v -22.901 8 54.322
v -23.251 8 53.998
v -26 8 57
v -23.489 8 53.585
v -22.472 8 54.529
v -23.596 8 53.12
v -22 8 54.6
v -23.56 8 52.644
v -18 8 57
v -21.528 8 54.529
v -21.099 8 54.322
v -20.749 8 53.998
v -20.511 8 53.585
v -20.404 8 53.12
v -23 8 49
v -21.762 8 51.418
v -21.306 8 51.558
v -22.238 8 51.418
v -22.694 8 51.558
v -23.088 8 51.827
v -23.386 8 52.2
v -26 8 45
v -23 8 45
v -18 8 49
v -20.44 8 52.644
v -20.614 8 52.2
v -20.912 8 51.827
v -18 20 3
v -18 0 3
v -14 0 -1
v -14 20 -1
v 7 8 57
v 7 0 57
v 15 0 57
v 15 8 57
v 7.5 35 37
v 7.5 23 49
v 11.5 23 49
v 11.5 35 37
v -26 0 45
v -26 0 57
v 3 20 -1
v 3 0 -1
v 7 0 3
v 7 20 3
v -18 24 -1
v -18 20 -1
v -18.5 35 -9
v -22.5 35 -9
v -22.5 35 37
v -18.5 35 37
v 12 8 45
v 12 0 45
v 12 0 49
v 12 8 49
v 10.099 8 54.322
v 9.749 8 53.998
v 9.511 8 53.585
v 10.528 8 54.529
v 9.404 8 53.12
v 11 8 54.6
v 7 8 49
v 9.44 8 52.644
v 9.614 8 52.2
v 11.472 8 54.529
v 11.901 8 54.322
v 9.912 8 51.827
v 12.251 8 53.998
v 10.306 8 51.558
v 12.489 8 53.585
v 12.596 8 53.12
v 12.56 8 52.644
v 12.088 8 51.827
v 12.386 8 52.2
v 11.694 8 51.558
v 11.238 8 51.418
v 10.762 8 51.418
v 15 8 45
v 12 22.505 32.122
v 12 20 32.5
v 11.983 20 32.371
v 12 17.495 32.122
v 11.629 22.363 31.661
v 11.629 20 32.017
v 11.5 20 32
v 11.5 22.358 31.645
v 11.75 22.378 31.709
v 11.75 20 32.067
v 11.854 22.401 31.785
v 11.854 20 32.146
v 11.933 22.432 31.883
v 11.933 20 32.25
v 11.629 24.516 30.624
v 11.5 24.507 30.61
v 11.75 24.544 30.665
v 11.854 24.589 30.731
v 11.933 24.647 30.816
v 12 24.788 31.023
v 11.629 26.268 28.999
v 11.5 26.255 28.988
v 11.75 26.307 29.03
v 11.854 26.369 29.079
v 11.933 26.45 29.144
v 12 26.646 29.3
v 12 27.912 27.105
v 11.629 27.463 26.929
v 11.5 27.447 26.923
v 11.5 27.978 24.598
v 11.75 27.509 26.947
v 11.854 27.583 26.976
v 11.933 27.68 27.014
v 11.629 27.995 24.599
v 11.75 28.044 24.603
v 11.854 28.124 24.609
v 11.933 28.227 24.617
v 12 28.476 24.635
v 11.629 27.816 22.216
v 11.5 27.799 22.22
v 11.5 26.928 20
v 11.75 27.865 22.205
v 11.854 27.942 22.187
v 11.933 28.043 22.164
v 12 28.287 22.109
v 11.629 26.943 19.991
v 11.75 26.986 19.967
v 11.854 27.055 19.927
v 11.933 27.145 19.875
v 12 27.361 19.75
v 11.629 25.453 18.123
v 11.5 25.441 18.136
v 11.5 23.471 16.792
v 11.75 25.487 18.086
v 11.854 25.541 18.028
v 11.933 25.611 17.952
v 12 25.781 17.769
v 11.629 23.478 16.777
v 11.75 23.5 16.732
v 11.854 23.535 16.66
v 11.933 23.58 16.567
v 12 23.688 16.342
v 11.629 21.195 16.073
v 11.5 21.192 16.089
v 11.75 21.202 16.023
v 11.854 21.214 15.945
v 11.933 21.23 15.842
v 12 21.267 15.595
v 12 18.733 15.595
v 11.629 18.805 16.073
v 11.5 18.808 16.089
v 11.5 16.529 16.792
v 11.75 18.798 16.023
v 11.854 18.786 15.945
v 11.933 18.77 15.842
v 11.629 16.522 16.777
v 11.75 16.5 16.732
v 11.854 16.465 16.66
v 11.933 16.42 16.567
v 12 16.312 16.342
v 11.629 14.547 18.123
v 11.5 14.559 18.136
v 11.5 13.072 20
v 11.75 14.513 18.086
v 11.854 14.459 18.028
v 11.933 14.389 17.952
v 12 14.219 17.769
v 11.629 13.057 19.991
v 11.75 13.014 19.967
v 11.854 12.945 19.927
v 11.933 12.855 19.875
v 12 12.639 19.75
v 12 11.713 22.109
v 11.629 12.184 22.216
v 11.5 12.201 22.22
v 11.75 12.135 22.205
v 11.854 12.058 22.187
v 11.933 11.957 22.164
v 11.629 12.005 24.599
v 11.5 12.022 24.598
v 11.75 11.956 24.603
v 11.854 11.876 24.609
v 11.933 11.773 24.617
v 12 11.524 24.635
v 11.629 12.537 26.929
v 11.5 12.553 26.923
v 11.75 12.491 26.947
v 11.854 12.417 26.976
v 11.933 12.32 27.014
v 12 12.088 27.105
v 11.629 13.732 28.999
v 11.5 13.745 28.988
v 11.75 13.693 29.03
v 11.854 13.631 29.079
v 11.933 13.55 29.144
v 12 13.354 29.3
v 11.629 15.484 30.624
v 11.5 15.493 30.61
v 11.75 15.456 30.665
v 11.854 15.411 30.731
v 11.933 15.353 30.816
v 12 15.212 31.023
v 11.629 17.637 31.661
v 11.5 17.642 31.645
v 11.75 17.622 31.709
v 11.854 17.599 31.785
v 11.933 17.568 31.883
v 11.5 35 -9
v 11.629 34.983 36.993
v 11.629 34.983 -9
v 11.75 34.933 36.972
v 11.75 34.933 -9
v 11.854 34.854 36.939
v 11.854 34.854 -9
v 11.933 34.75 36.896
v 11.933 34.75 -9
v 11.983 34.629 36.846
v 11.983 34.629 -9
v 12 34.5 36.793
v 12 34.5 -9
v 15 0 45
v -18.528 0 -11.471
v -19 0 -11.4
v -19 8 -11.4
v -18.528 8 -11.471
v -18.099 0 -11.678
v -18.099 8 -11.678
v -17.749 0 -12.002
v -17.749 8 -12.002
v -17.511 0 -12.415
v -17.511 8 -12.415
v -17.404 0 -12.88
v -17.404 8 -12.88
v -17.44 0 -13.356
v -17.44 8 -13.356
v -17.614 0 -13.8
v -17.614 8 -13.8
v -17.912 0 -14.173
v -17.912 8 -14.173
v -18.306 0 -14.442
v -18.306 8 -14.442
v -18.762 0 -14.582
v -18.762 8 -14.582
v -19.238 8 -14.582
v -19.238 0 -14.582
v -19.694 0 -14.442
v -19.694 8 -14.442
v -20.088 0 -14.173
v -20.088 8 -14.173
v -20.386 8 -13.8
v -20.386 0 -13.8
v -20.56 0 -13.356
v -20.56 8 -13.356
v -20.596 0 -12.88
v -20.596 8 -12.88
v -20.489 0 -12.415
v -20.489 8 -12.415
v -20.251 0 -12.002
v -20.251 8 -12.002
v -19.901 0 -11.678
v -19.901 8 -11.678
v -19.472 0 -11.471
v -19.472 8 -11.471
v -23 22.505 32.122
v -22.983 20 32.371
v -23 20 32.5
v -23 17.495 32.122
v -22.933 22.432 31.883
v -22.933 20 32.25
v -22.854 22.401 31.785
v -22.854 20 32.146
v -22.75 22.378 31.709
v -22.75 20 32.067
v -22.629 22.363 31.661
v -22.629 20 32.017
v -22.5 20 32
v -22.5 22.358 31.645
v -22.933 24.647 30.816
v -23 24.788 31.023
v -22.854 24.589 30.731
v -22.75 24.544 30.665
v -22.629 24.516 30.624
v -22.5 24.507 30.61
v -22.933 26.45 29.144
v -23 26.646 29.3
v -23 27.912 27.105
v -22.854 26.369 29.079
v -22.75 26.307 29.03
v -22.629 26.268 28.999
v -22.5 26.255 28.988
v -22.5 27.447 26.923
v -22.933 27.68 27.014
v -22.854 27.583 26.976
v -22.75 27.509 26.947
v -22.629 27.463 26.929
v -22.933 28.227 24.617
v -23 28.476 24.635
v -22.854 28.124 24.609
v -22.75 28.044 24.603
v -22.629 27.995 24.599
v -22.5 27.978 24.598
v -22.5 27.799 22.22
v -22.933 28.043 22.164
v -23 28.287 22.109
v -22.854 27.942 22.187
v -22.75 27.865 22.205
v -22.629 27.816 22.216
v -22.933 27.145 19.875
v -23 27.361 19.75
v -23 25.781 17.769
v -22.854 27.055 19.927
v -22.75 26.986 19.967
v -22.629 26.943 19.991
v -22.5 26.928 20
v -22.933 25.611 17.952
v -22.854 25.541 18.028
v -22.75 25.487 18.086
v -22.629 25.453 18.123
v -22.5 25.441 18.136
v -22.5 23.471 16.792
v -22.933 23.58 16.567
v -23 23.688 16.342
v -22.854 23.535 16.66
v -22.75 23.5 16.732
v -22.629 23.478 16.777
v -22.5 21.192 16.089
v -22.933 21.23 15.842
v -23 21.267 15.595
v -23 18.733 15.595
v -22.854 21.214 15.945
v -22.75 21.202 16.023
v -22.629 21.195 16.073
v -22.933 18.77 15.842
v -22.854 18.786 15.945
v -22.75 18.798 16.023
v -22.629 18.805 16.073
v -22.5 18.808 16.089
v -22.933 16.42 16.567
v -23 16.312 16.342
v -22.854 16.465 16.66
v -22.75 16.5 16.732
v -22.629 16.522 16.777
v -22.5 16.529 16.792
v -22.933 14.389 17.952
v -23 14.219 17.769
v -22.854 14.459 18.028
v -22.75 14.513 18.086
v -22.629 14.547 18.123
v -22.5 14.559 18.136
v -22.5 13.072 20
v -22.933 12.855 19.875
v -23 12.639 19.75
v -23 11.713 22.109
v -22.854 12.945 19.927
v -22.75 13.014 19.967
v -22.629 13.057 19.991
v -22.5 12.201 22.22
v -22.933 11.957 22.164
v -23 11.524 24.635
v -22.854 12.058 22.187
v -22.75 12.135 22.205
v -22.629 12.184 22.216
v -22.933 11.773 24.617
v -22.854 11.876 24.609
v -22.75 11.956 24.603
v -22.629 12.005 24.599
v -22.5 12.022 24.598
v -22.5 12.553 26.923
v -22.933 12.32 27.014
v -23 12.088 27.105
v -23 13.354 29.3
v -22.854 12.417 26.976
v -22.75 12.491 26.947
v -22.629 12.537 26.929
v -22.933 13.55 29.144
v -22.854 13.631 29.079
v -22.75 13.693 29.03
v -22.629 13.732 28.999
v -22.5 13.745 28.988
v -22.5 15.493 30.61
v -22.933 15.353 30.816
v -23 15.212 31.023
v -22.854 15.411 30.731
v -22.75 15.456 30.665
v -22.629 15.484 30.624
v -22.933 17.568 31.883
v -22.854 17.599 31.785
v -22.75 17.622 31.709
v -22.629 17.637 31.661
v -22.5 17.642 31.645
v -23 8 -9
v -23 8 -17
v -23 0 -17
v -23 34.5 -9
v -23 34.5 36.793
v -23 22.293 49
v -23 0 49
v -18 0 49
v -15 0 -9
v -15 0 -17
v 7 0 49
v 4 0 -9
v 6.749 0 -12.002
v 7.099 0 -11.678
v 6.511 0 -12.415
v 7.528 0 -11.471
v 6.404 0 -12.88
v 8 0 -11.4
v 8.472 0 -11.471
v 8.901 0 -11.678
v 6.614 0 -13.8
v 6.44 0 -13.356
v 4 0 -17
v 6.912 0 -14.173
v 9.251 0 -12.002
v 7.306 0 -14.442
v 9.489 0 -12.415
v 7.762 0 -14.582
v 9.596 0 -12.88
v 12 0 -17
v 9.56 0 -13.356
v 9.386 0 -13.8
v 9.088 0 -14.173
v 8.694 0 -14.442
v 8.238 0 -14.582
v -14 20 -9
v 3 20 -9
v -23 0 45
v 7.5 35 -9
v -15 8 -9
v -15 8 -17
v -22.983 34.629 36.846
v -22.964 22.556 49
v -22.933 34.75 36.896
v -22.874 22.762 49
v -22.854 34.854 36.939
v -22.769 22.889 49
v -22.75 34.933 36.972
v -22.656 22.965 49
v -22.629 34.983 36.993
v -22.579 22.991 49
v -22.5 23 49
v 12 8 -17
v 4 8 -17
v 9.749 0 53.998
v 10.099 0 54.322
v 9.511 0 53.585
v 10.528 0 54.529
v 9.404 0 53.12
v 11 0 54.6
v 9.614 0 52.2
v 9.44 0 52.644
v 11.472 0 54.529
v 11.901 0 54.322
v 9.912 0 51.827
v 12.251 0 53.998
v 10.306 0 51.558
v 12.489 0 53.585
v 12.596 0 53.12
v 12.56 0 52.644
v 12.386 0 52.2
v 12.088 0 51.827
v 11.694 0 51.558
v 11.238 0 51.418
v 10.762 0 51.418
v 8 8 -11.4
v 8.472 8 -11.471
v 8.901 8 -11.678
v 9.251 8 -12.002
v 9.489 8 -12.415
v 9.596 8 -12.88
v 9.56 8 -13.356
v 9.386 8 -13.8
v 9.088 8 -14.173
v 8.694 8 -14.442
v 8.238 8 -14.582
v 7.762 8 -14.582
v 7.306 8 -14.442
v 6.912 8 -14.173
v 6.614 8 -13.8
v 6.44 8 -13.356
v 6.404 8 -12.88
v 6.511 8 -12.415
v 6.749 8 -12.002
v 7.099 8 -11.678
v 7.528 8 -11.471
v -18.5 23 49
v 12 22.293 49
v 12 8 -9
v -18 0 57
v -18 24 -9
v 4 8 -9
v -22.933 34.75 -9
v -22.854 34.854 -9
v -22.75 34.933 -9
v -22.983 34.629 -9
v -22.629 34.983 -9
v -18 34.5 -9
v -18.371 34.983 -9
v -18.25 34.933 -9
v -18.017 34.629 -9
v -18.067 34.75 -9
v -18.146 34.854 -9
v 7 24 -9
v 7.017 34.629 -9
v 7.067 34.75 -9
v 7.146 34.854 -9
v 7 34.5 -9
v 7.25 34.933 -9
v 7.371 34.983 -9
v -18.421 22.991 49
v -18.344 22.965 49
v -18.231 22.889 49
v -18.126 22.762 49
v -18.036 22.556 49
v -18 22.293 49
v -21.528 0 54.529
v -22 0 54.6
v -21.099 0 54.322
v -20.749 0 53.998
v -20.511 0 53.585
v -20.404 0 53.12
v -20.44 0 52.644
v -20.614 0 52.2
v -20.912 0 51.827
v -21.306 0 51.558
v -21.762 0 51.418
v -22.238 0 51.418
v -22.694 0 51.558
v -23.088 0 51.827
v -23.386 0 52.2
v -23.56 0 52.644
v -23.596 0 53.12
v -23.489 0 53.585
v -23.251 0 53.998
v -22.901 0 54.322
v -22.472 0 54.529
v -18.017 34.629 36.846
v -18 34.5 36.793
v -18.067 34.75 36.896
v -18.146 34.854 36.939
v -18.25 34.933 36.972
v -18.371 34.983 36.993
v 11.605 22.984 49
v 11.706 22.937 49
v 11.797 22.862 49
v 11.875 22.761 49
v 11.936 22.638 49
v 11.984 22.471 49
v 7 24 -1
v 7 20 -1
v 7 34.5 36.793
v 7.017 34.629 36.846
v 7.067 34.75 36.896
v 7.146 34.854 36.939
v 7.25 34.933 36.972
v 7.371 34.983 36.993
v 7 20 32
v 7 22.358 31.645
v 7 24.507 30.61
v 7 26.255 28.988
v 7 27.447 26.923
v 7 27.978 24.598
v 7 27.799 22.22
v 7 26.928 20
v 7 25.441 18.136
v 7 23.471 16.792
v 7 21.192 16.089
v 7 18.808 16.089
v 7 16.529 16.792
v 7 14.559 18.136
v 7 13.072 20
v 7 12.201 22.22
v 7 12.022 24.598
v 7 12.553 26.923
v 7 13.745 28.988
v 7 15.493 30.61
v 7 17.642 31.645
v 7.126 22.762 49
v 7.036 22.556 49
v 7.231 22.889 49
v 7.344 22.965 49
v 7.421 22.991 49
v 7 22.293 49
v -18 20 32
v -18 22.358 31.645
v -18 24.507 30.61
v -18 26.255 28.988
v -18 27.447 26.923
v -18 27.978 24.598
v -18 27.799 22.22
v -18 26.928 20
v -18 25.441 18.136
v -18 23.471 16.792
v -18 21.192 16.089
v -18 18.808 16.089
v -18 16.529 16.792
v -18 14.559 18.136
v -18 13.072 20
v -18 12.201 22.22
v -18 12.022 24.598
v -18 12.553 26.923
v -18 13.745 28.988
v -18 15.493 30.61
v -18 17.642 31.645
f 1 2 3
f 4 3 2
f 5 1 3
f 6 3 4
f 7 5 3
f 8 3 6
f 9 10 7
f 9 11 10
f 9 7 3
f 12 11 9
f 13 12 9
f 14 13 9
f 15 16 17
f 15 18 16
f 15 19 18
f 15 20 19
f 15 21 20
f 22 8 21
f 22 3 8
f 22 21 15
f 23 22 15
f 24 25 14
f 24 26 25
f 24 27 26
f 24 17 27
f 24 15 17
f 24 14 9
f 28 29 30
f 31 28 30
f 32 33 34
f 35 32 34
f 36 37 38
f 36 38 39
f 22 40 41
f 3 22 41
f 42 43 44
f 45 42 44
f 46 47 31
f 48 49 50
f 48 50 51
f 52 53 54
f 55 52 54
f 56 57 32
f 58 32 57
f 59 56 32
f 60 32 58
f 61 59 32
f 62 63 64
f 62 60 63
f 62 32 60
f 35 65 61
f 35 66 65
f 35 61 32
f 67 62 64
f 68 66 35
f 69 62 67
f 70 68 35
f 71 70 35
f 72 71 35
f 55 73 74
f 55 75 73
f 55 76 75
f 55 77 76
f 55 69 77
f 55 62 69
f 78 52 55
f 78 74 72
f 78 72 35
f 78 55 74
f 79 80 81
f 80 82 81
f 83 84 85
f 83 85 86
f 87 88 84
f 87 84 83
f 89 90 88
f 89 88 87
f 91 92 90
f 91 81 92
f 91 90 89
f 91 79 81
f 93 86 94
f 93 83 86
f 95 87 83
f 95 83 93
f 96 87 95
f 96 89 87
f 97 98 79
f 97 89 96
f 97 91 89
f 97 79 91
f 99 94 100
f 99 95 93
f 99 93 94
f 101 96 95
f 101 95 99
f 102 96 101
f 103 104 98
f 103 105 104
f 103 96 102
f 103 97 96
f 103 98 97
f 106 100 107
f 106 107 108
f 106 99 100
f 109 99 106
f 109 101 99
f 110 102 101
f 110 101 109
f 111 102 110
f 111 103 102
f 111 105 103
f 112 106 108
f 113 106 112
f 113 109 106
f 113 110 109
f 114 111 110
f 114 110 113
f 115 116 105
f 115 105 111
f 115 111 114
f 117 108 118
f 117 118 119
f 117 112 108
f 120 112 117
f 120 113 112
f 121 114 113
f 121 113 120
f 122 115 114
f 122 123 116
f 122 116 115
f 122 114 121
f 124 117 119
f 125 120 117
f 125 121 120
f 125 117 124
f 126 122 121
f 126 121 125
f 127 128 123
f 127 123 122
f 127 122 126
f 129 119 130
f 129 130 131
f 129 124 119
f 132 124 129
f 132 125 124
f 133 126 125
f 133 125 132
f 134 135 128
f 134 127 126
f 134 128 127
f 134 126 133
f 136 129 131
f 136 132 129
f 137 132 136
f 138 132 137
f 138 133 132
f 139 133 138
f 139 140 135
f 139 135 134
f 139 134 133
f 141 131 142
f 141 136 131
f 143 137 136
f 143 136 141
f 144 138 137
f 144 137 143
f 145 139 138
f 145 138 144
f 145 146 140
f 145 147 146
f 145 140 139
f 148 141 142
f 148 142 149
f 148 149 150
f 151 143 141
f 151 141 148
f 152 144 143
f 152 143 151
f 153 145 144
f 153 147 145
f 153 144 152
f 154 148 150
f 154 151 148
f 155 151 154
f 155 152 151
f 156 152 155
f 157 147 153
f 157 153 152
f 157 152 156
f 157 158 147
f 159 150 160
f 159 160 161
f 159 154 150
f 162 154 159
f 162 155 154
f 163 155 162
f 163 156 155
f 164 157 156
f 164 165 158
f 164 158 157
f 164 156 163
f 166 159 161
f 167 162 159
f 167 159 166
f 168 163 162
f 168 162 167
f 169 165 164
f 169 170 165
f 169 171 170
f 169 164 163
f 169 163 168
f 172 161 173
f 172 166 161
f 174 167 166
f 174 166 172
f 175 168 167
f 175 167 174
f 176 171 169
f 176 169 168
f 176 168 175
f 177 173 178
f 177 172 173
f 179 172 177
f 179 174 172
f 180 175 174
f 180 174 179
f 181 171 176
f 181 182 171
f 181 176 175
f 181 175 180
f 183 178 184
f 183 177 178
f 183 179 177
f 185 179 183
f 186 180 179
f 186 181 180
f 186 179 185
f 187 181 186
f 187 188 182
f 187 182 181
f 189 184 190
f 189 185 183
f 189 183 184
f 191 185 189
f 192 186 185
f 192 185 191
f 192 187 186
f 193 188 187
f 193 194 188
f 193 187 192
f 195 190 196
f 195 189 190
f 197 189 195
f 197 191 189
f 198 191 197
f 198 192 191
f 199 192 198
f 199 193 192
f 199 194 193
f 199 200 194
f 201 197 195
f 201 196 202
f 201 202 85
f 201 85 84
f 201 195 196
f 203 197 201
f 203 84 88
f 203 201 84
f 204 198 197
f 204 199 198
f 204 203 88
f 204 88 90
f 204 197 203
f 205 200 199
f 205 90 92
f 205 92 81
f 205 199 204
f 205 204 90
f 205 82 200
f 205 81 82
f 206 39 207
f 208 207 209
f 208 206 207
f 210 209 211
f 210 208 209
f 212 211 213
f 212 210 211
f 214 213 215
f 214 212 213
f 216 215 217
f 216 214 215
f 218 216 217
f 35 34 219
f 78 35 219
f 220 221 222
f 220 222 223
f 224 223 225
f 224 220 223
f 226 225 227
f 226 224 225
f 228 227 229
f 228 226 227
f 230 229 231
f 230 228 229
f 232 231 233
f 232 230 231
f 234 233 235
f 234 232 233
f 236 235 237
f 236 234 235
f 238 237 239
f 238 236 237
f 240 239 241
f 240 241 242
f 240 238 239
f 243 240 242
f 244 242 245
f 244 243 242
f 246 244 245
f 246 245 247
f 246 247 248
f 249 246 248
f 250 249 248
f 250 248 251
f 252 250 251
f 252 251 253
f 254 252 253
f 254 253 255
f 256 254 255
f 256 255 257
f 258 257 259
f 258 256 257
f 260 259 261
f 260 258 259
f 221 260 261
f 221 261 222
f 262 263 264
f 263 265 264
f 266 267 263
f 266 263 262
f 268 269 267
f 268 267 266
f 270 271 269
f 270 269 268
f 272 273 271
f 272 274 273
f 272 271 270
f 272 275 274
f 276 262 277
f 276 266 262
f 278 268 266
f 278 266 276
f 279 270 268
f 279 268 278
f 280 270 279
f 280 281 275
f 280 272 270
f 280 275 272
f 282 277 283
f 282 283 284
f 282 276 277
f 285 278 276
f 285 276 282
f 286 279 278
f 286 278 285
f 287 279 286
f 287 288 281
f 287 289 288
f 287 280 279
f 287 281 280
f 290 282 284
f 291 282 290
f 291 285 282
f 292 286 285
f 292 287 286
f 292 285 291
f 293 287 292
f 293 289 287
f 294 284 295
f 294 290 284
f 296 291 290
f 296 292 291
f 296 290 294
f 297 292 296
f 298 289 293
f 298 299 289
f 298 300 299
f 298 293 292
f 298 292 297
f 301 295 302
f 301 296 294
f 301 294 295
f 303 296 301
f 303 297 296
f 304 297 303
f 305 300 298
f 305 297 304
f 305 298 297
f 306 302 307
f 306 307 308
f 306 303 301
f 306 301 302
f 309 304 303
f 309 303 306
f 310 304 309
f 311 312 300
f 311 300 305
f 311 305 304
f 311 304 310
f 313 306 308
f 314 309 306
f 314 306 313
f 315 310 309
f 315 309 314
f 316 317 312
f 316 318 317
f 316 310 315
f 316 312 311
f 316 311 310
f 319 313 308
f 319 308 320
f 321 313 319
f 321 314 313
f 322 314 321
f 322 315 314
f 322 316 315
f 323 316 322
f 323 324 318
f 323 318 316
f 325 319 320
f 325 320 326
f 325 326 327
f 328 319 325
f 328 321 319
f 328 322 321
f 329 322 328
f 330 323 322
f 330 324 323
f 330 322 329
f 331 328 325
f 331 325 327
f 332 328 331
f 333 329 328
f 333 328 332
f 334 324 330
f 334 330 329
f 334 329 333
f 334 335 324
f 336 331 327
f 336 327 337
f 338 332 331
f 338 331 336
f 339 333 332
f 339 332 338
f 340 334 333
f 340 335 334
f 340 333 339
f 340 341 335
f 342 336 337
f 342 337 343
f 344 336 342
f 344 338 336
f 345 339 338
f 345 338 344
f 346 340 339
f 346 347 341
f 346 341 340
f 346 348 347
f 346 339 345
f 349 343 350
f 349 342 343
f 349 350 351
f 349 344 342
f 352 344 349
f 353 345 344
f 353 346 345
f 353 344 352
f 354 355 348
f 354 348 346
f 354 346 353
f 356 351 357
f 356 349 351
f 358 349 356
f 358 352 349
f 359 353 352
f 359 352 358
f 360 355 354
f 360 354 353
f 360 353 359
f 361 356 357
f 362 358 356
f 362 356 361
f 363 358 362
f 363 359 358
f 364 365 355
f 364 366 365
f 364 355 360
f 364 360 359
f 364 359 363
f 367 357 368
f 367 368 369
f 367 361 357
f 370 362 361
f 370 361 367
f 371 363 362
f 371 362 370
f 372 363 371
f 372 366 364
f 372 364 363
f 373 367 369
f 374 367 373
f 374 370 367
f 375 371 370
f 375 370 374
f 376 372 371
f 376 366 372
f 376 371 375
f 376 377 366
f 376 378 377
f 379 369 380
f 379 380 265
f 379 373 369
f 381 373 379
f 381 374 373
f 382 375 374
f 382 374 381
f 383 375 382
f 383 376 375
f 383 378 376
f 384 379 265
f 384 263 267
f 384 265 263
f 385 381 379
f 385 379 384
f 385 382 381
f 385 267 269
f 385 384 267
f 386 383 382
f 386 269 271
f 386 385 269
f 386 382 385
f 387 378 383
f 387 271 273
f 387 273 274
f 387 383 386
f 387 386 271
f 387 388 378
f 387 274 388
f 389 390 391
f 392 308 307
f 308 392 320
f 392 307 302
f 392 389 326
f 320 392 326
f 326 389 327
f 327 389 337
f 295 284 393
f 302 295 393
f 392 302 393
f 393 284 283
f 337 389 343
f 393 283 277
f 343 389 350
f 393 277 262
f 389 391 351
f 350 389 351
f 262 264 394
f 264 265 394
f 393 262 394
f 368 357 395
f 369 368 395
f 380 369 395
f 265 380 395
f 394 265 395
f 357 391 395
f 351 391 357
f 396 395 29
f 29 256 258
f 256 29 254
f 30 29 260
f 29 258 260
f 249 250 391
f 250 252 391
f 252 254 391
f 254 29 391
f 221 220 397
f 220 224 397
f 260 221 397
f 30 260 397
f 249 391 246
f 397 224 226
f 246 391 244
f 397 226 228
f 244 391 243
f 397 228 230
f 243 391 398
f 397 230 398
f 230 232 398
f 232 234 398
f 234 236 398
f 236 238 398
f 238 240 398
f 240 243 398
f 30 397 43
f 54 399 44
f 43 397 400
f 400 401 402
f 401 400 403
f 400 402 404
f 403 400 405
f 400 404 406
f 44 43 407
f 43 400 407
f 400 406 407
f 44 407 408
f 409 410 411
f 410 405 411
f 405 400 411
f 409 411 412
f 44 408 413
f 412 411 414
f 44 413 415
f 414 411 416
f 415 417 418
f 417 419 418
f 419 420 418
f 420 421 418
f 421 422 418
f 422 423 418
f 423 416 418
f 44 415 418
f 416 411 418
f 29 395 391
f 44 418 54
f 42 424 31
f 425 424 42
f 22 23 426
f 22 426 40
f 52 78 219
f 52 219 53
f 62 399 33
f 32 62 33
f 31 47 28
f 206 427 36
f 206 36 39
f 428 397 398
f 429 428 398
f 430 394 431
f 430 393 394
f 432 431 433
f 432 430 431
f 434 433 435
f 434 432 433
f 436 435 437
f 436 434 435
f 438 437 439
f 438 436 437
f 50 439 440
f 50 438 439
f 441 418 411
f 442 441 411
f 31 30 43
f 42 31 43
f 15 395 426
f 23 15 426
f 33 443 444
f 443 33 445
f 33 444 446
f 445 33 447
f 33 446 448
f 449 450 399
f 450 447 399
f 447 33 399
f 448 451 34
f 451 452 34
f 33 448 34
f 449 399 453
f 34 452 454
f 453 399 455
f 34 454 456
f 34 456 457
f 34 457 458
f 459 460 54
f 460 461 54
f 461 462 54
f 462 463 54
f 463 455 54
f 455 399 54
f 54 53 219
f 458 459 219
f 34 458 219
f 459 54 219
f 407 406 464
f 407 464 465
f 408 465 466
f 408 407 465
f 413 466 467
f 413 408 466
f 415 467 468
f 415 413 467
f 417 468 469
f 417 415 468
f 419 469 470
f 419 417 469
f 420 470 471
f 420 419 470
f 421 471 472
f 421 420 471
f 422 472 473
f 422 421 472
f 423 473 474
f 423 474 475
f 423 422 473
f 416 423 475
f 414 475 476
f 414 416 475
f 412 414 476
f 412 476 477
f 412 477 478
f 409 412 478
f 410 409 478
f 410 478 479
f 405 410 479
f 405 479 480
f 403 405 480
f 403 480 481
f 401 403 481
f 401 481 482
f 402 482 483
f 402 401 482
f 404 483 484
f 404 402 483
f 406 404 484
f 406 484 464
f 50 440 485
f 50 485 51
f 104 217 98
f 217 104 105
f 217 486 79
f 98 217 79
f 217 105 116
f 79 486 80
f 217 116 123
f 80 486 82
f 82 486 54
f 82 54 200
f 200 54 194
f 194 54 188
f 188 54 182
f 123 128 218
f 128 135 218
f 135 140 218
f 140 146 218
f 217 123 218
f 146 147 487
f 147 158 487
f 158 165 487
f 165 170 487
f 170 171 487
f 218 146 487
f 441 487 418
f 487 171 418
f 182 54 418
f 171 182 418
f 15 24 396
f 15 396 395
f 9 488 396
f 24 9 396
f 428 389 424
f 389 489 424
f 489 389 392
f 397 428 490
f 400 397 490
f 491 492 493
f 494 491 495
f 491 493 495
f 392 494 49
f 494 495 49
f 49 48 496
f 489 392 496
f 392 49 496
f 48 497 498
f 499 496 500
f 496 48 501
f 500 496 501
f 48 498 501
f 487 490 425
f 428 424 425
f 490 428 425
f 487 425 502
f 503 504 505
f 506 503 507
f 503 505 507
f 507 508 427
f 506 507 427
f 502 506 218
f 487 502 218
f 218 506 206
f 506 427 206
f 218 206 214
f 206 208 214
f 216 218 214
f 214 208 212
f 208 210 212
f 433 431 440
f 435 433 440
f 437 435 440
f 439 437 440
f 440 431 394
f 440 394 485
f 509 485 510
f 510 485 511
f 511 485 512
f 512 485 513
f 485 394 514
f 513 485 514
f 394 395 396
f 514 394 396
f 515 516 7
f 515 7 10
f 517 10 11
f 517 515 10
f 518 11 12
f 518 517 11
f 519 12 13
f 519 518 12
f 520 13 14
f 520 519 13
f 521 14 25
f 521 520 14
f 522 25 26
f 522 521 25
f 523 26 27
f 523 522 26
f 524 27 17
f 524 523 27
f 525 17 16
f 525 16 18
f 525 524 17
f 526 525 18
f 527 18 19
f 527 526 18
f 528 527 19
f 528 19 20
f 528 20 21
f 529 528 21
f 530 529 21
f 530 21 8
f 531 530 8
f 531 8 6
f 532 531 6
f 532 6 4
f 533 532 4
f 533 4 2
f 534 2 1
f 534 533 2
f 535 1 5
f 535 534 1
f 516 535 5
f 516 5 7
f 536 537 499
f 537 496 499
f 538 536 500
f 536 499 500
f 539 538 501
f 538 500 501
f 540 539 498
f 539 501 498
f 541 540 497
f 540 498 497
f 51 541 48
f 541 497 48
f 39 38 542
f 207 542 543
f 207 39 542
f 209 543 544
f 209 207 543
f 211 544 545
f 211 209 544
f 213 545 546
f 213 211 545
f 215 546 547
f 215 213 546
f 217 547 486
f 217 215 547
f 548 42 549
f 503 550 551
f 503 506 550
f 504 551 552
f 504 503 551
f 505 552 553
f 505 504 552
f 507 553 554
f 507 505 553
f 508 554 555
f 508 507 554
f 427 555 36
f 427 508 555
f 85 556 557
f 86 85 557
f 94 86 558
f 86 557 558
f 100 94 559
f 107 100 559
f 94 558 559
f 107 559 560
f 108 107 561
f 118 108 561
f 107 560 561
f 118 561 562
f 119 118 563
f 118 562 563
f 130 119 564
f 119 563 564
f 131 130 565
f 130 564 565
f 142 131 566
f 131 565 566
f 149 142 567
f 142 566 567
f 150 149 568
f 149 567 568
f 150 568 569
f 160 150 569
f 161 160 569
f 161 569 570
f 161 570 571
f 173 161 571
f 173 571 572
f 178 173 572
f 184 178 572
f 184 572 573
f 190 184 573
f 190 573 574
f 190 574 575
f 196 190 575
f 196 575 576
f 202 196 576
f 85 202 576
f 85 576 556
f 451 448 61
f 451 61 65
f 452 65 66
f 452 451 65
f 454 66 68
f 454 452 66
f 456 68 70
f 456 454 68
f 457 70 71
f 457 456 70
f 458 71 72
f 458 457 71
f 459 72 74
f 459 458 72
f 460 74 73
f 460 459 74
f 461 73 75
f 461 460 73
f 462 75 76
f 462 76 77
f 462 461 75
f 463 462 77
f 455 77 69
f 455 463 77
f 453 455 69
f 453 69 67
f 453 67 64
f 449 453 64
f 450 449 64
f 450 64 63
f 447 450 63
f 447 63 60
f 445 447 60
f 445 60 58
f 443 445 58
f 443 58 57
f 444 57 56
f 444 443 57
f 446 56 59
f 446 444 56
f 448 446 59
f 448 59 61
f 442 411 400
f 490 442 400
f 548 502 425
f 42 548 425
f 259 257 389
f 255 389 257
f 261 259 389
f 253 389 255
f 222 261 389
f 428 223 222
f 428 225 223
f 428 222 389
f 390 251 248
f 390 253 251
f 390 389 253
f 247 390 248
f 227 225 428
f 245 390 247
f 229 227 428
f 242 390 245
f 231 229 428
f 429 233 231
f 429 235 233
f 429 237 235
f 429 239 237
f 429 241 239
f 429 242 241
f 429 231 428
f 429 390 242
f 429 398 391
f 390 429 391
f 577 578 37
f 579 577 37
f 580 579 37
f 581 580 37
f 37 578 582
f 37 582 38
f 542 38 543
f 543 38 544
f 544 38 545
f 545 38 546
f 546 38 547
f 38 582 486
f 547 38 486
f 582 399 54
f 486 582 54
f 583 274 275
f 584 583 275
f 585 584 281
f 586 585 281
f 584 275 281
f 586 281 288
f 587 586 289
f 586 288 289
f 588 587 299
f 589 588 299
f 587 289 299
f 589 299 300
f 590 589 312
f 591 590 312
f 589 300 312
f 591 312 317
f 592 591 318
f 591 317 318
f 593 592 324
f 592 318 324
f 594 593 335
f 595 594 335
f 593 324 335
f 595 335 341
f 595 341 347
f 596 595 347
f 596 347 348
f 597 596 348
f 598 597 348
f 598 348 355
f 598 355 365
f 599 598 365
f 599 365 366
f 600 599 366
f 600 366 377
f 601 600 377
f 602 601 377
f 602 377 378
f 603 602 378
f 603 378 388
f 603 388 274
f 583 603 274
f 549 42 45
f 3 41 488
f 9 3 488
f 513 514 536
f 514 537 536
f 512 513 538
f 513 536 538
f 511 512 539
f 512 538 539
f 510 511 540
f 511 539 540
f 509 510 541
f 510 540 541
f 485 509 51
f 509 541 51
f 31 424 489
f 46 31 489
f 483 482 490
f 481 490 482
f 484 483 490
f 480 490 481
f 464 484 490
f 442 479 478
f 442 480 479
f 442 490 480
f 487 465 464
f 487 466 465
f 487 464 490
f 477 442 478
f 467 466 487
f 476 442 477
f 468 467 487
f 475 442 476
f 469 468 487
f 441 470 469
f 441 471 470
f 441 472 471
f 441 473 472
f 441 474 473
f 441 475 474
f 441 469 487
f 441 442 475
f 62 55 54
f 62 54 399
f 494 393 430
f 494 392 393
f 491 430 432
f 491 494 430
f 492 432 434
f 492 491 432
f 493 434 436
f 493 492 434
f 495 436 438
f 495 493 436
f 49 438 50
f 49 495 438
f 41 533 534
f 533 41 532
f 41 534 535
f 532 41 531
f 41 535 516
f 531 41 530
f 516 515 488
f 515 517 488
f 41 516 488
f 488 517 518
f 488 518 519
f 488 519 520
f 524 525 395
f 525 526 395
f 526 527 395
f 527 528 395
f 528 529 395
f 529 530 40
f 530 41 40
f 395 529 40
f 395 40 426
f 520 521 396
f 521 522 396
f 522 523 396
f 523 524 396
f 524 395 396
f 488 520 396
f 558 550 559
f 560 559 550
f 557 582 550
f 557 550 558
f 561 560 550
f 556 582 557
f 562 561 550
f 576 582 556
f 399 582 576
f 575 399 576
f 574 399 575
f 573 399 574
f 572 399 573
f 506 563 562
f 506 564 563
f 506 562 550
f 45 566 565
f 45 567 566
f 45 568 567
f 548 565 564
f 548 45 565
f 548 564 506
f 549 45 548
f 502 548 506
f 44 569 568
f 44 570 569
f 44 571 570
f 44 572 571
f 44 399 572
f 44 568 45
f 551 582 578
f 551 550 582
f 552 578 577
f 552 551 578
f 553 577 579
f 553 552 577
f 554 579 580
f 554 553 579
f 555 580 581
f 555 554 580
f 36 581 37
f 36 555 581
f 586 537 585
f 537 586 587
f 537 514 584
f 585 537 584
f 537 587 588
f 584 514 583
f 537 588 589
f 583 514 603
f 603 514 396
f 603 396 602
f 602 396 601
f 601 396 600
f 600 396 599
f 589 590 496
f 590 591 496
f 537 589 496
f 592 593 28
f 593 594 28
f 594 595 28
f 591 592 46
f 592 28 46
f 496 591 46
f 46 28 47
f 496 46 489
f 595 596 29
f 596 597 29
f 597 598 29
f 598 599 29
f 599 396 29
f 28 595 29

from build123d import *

# Parameters (mm, degrees)
ESQUISSE1_W             = 5
ESQUISSE1_H             = 58
BOSS_EXTRU_1_DEPTH      = 35
BOSS_EXTRU_1_2_DEPTH    = 35
BOSS_EXTRU_6_DEPTH      = 20
ESQUISSE1_6_W           = 8
ESQUISSE1_6_H           = 8
ESQUISSE1_6_R           = 1.6
BOSS_EXTRU_7_DEPTH      = 8
ESQUISSE1_8_R           = 1.6
BOSS_EXTRU_8_DEPTH      = 8
BOSS_EXTRU_8_2_DEPTH    = 8
ENL_V_MAT_EXTRU_3_DEPTH = 40
ESQUISSE6_R             = 8
ENL_V_MAT_EXTRU_4_DEPTH = 40
BOSS_EXTRU_9_DEPTH      = 8
CONG_1_R                = 0.5


with BuildPart() as part:
    # Esquisse1 → Boss.-Extru.1 (new body)
    with BuildSketch(Plane(origin=(0, 0, 0), x_dir=(1, 0, 0), z_dir=(0, 1, 0))):
        with Locations((-20.5, -20)):
            Rectangle(ESQUISSE1_W, ESQUISSE1_H)
    extrude(amount=BOSS_EXTRU_1_DEPTH)


with BuildPart() as body_2:
    # Esquisse1 → Boss.-Extru.1 2 (new body)
    with BuildSketch(Plane(origin=(0, 0, 0), x_dir=(1, 0, 0), z_dir=(0, 1, 0))):
        with Locations((9.5, -20)):
            Rectangle(ESQUISSE1_W, ESQUISSE1_H)
    extrude(amount=BOSS_EXTRU_1_2_DEPTH)


with BuildPart() as body_3:
    # Esquisse1<5> → Boss.-Extru.6 (new body)
    with BuildSketch(Plane(origin=(0, 0, 0), x_dir=(1, 0, 0), z_dir=(0, 1, 0))):
        Polygon((-18, 9), (-18, -3), (-14, 1), (3, 1), (7, -3), (7, 9), (4, 9), (-15, 9), align=None)
    extrude(amount=BOSS_EXTRU_6_DEPTH)

    # Esquisse1<6> → Boss.-Extru.7 (add)
    # profile 1 of 2: a face of its own
    with BuildSketch(Plane(origin=(0, 0, 0), x_dir=(1, 0, 0), z_dir=(0, 1, 0))):
        with Locations((-19, 13)):
            Rectangle(ESQUISSE1_6_W, ESQUISSE1_6_H)
        with Locations((-19, 13)):
            Circle(ESQUISSE1_6_R, mode=Mode.SUBTRACT)
    # profile 2 of 2: a face of its own
    with BuildSketch(Plane(origin=(0, 0, 0), x_dir=(1, 0, 0), z_dir=(0, 1, 0))):
        with Locations((8, 13)):
            Rectangle(ESQUISSE1_6_W, ESQUISSE1_6_H)
        with Locations((8, 13)):
            Circle(ESQUISSE1_6_R, mode=Mode.SUBTRACT)
    extrude(amount=BOSS_EXTRU_7_DEPTH)


with BuildPart() as body_4:
    # Esquisse1<8> → Boss.-Extru.8 (new body)
    with BuildSketch(Plane(origin=(0, 0, 0), x_dir=(1, 0, 0), z_dir=(0, 1, 0))):
        Polygon((-18, -57), (-18, -49), (-23, -49), (-23, -45), (-26, -45), (-26, -57), align=None)
        with Locations((-22, -53)):
            Circle(ESQUISSE1_8_R, mode=Mode.SUBTRACT)
    extrude(amount=BOSS_EXTRU_8_DEPTH)


with BuildPart() as body_5:
    # Esquisse1<8> → Boss.-Extru.8 2 (new body)
    with BuildSketch(Plane(origin=(0, 0, 0), x_dir=(1, 0, 0), z_dir=(0, 1, 0))):
        Polygon((12, -49), (7, -49), (7, -57), (15, -57), (15, -45), (12, -45), align=None)
        with Locations((11, -53)):
            Circle(ESQUISSE1_8_R, mode=Mode.SUBTRACT)
    extrude(amount=BOSS_EXTRU_8_2_DEPTH)


with BuildPart() as enl_v_mat_extru_3_tool:
    # Esquisse7 → Enlèv. mat.-Extru.3 (new body)
    with BuildSketch(Plane.ZY.offset(23)):
        Polygon((49, 35), (49, 23), (37, 35), align=None)
    extrude(amount=-ENL_V_MAT_EXTRU_3_DEPTH)


with BuildPart() as part_1:
    add(part.part)

    # Enlèv. mat.-Extru.3: cut by enl_v_mat_extru_3_tool
    add(enl_v_mat_extru_3_tool.part, mode=Mode.SUBTRACT)


with BuildPart() as body_2_1:
    add(body_2.part)

    # Enlèv. mat.-Extru.3: cut by enl_v_mat_extru_3_tool
    add(enl_v_mat_extru_3_tool.part, mode=Mode.SUBTRACT)


with BuildPart() as enl_v_mat_extru_4_tool:
    # Esquisse6 → Enlèv. mat.-Extru.4 (new body)
    with BuildSketch(Plane.ZY.offset(23)):
        with Locations((24, 20)):
            Circle(ESQUISSE6_R)
    extrude(amount=-ENL_V_MAT_EXTRU_4_DEPTH)


with BuildPart() as part_2:
    add(part_1.part)

    # Enlèv. mat.-Extru.4: cut by enl_v_mat_extru_4_tool
    add(enl_v_mat_extru_4_tool.part, mode=Mode.SUBTRACT)



with BuildPart() as body_2_2:
    add(body_2_1.part)

    # Enlèv. mat.-Extru.4: cut by enl_v_mat_extru_4_tool
    add(enl_v_mat_extru_4_tool.part, mode=Mode.SUBTRACT)


with BuildPart() as part_3:
    add(part_2.part)

    add(body_2_2.part)  # Boss.-Extru.9 merges body 2

    add(body_3.part)  # Boss.-Extru.9 merges body 3
    # Esquisse10 → Boss.-Extru.9 (add)
    with BuildSketch(Plane(origin=(0, 0, -9), x_dir=(-1, 0, 0), z_dir=(0, 0, -1))):
        Polygon((-7, 20), (-7, 24), (-3, 20), align=None)
        Polygon((18, 20), (14, 20), (18, 24), align=None)
    extrude(amount=-BOSS_EXTRU_9_DEPTH)

    # Congé1
    cong_1_edges = [part_3.edges().sort_by_distance(p)[0] for p in [
        (12, 20, 16),
        (-23, 20, 16),
        (-23, 29, 43),
        (-18, 29, 43),
        (7, 29, 43),
        (12, 29, 43),
        (-23, 35, 14),
        (-18, 35, 14),
        (7, 35, 14),
        (12, 35, 14),
    ]]
    fillet(cong_1_edges, radius=CONG_1_R)


solid = Compound([body_4.part, body_5.part, part_3.part])
